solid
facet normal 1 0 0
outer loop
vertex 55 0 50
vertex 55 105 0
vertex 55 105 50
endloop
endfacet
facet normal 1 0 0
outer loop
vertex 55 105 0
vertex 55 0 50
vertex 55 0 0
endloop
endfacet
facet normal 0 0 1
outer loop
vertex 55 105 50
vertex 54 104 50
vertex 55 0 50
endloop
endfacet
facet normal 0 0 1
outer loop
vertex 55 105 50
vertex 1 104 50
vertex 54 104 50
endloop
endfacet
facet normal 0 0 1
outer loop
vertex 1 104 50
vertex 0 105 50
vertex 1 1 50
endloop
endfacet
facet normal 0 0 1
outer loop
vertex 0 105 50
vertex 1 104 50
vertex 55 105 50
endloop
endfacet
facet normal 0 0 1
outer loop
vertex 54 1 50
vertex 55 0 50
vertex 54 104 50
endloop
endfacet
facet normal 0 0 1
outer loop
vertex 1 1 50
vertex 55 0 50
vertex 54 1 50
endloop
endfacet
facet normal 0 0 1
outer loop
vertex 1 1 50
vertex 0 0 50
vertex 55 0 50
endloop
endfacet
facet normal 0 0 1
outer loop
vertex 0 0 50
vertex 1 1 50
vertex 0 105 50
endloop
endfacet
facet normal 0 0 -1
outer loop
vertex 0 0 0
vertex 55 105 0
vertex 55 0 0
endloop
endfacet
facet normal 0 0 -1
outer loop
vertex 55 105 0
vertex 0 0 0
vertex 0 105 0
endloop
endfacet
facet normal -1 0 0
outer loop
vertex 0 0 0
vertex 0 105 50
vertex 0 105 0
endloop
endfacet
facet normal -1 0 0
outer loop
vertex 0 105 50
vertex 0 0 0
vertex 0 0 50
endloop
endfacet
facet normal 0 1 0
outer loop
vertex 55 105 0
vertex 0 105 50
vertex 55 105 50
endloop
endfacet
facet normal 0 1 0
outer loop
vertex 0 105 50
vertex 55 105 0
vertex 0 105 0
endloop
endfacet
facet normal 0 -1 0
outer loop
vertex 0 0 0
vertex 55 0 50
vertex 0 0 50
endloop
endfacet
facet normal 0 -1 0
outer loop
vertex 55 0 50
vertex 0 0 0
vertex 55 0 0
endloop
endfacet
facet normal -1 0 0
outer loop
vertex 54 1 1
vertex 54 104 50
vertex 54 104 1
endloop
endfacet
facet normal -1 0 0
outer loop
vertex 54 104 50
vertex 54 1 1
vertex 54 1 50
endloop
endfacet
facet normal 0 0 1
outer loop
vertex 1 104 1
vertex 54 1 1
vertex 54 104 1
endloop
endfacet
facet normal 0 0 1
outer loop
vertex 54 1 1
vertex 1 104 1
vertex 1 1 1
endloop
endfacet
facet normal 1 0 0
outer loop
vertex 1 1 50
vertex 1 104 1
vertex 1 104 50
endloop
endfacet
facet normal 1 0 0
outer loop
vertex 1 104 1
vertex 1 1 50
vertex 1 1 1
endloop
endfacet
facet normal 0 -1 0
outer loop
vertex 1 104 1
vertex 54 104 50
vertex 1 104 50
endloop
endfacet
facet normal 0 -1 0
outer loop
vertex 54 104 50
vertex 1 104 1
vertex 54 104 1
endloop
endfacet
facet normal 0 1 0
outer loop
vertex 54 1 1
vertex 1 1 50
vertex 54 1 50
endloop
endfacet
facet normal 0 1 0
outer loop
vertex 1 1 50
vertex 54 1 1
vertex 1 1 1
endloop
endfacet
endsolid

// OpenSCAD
for(i = [0:0]){
    for(j = [0:0]){
        translate([i*50,j*57,0])
        difference(){
        cube([55,105,50]);
        translate([1,1,1])
        cube([53,103,49]);
    }
}
}
